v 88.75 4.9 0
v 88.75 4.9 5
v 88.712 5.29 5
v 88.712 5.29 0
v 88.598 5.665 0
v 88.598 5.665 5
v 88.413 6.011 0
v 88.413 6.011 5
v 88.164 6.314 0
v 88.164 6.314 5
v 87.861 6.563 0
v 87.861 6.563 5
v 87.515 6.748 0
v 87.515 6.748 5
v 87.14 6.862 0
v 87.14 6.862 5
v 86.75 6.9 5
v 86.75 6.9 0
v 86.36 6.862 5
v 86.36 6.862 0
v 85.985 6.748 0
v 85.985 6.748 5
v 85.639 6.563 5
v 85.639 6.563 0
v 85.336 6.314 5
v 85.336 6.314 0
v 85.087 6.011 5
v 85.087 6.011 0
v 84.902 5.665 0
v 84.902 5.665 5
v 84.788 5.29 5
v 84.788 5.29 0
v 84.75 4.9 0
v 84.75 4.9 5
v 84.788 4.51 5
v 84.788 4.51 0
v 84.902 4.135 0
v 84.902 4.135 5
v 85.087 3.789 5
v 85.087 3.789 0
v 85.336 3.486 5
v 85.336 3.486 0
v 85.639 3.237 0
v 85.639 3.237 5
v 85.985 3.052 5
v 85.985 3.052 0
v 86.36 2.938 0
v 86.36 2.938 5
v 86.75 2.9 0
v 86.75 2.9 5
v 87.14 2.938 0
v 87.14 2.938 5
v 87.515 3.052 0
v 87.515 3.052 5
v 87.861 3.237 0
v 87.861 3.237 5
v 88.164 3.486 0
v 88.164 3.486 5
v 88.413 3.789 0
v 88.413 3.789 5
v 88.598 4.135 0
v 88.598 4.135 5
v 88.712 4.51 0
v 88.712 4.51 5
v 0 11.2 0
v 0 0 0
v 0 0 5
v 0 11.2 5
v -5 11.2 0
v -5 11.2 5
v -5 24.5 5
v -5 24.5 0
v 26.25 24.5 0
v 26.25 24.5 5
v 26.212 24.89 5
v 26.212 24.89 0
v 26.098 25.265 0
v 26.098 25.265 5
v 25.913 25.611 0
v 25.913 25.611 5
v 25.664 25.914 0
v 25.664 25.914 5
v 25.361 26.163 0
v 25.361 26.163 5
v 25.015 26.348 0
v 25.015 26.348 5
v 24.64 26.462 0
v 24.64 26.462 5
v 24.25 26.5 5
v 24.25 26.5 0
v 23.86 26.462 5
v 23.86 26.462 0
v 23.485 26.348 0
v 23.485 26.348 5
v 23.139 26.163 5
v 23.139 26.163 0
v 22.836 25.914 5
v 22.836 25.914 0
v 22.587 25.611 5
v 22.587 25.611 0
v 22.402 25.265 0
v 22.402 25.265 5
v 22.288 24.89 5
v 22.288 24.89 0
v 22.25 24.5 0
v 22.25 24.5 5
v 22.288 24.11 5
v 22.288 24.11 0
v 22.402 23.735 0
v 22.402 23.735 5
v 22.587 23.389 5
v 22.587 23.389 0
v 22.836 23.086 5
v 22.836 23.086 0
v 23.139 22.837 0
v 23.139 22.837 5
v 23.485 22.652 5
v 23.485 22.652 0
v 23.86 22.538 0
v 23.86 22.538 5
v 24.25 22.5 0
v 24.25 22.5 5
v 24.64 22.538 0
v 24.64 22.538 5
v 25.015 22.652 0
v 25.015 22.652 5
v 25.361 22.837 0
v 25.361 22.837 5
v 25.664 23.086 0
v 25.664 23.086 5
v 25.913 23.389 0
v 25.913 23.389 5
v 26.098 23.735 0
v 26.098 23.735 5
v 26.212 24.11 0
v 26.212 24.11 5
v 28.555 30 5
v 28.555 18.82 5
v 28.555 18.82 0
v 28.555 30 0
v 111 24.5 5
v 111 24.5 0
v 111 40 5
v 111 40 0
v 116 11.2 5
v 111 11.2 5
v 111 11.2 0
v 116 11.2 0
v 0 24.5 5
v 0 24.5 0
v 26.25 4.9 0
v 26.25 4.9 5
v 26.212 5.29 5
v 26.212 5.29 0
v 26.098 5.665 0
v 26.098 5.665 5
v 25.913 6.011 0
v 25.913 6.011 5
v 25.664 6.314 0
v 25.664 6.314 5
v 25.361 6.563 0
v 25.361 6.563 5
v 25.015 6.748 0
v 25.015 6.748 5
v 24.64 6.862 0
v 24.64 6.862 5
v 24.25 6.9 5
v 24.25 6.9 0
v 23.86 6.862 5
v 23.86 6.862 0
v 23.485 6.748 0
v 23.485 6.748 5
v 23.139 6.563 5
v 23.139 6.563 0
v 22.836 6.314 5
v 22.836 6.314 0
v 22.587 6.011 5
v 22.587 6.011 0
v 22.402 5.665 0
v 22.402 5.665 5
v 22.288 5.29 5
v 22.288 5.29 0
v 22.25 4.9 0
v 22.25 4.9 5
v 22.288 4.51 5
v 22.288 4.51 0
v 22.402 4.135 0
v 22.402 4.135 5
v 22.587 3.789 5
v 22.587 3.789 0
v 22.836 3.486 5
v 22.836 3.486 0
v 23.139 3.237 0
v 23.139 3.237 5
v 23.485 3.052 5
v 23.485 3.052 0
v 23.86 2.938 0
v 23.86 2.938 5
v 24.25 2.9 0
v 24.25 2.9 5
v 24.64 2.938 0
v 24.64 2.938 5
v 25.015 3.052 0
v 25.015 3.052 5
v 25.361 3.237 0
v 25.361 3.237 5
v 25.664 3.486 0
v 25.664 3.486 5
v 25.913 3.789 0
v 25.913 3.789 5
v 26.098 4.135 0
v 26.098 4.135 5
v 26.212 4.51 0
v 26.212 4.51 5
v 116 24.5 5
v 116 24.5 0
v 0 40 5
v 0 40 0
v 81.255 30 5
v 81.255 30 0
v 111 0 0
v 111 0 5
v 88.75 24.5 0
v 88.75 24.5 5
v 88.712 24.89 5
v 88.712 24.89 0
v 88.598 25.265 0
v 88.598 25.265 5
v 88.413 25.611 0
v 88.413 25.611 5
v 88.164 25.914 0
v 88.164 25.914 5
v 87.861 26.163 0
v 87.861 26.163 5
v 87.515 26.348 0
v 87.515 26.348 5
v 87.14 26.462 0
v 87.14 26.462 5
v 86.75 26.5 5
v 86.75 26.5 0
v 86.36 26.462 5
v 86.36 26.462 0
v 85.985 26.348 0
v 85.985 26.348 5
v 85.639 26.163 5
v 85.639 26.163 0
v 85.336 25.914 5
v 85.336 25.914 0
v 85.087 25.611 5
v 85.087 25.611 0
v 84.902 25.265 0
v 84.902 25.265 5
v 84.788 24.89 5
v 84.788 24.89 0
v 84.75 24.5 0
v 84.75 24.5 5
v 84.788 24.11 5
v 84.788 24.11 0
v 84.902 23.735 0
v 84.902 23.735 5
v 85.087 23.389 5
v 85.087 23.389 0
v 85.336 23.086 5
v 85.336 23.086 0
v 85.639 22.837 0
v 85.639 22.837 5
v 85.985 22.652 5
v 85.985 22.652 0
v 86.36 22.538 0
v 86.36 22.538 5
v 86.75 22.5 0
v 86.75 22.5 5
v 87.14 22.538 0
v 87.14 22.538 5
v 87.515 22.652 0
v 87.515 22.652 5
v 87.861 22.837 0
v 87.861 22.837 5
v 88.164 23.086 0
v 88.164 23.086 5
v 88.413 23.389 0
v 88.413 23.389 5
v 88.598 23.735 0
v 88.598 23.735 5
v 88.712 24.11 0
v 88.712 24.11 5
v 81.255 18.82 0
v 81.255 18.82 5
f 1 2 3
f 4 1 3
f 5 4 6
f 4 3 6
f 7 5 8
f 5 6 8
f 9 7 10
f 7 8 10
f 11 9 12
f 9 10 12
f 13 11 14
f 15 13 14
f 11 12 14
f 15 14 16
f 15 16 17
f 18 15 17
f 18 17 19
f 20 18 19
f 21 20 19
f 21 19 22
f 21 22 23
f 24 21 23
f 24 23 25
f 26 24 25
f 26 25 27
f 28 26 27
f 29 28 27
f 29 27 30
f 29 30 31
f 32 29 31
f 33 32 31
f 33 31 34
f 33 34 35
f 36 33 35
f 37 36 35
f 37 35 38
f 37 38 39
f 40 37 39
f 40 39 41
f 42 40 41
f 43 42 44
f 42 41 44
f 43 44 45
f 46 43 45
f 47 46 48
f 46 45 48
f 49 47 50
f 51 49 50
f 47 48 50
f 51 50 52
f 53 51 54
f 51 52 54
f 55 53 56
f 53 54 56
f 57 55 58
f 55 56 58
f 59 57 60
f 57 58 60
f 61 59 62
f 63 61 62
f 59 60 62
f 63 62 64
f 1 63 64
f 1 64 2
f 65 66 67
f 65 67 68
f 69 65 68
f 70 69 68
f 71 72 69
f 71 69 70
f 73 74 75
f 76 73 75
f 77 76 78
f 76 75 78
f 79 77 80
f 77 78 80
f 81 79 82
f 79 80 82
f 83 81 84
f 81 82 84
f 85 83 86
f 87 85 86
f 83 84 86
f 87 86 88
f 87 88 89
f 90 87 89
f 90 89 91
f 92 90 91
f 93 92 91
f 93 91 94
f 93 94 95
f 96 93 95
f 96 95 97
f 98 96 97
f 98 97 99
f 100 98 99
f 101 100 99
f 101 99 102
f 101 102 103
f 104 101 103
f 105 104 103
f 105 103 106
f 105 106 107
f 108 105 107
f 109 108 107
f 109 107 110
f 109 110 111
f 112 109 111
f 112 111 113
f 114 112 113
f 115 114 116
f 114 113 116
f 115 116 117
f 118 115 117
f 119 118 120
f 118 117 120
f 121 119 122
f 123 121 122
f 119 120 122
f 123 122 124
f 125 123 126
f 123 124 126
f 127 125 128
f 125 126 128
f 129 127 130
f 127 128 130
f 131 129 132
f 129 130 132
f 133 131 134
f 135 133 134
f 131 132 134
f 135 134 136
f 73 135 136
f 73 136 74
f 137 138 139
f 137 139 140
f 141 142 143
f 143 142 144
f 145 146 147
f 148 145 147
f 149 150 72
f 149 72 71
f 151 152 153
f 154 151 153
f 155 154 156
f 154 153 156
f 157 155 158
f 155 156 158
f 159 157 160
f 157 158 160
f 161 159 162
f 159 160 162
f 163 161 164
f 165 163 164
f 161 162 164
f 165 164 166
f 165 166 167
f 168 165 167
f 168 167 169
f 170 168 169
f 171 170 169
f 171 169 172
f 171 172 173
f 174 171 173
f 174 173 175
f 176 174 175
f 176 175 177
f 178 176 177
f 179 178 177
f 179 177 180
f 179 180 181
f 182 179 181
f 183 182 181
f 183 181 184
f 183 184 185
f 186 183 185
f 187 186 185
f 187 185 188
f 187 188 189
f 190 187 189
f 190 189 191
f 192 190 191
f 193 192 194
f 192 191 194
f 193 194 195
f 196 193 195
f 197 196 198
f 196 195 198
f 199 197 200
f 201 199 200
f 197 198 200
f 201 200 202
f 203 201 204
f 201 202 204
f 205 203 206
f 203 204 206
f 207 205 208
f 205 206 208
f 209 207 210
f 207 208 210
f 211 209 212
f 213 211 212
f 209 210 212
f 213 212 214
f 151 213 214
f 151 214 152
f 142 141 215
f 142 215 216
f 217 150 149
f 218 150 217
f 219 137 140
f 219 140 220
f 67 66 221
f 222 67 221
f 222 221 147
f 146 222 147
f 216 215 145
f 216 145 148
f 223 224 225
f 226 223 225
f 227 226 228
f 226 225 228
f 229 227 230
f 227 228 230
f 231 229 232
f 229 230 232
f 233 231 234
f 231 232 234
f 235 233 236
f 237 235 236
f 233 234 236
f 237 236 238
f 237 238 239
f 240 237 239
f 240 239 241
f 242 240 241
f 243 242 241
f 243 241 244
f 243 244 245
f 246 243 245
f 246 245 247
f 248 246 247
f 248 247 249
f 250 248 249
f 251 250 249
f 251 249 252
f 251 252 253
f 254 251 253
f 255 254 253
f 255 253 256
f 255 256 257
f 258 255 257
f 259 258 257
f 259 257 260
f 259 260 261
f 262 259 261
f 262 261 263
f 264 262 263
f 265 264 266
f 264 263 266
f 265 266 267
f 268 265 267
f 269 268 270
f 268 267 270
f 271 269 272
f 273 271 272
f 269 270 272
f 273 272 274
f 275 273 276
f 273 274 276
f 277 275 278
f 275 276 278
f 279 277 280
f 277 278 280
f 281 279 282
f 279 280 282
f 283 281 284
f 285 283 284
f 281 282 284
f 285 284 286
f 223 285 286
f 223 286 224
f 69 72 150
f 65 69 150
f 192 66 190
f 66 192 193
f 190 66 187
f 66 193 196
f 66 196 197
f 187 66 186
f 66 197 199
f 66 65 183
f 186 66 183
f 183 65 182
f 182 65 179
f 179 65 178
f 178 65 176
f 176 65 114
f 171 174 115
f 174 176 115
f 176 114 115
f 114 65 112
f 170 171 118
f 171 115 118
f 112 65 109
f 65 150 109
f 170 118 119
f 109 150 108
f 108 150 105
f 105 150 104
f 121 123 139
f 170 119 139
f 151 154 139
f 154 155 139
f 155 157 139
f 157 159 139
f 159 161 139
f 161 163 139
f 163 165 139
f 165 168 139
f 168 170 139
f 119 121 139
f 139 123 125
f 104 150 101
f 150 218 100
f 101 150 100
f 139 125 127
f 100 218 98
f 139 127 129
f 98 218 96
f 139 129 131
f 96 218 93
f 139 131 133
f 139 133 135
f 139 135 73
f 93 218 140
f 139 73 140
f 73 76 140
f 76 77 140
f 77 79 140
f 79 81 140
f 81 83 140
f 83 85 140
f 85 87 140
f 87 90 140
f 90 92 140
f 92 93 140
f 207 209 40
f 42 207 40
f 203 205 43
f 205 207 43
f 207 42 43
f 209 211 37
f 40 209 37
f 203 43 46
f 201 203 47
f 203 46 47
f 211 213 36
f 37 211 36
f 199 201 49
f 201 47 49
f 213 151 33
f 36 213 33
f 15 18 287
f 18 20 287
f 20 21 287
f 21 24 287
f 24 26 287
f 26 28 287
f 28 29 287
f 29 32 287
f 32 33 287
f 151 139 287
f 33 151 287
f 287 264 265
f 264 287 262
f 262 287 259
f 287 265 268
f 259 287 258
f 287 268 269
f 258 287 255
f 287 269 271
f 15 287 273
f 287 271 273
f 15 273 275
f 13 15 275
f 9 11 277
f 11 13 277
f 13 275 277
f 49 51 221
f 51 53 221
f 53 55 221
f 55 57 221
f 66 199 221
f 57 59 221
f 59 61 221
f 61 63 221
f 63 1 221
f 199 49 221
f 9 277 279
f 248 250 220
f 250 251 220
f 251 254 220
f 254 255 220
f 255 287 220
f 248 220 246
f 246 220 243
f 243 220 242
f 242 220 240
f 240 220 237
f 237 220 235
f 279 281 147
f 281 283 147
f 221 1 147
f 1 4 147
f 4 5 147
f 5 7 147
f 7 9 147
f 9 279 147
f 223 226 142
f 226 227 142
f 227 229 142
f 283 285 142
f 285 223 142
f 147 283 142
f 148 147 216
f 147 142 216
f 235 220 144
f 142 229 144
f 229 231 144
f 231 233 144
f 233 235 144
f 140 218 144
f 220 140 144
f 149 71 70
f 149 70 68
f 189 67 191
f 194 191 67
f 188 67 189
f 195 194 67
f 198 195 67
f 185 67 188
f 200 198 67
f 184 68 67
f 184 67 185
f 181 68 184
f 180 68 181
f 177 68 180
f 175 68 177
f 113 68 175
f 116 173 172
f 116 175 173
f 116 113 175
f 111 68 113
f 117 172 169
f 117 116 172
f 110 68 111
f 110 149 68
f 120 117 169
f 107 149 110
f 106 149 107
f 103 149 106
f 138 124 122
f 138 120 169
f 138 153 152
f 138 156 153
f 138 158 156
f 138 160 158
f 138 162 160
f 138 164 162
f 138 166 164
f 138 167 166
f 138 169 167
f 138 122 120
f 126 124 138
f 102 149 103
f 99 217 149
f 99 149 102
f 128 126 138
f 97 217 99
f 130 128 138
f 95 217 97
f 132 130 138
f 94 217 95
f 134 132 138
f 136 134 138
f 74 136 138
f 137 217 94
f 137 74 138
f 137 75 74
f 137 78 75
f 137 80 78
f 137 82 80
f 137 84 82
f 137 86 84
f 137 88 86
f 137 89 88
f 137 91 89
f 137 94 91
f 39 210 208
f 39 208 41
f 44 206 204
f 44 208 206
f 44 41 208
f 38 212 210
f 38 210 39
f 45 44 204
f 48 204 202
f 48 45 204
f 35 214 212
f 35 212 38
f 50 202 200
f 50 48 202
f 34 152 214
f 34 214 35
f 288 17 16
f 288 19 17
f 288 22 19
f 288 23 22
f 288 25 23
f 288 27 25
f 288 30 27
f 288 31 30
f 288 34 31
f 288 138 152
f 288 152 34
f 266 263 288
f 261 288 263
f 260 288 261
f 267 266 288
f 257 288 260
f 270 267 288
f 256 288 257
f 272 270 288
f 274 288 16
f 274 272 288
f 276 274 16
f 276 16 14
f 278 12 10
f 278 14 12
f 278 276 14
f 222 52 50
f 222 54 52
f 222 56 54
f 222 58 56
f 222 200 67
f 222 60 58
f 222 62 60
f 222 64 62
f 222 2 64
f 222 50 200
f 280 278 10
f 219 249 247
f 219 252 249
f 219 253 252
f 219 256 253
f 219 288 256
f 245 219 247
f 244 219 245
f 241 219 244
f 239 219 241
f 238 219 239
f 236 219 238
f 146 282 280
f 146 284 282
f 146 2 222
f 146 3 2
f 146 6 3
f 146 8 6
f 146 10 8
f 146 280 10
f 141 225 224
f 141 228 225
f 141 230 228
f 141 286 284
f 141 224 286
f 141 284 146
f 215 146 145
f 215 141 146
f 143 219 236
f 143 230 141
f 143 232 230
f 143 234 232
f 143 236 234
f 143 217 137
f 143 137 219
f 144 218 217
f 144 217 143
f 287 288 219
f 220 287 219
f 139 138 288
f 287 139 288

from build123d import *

# Parameters (mm, degrees)
CROQUIS1_W              = 111
CROQUIS1_H              = 40
SALIENTE_EXTRUIR1_DEPTH = 5
CROQUIS2_R              = 2
CROQUIS2_W              = 52.7
CROQUIS2_H              = 11.179597985
CORTAR_EXTRUIR1_DEPTH   = 10
CROQUIS3_W              = 5
CROQUIS3_H              = 13.3
SALIENTE_EXTRUIR2_DEPTH = 5
CROQUIS4_W              = 5
CROQUIS4_H              = 13.3
SALIENTE_EXTRUIR3_DEPTH = 5


with BuildPart() as part:
    # Croquis1 → Saliente-Extruir1 (new body)
    with BuildSketch(Plane.XY):
        with Locations((55.5, 20)):
            Rectangle(CROQUIS1_W, CROQUIS1_H)
    extrude(amount=SALIENTE_EXTRUIR1_DEPTH)

    # Croquis2 → Cortar-Extruir1 (cut)
    with BuildSketch(Plane.XY.offset(5)):
        with Locations((24.25, 24.5)):
            Circle(CROQUIS2_R)
        with Locations((86.75, 24.5)):
            Circle(CROQUIS2_R)
        with Locations((24.25, 4.9)):
            Circle(CROQUIS2_R)
        with Locations((86.75, 4.9)):
            Circle(CROQUIS2_R)
        with Locations((54.905498666, 24.410201008)):
            Rectangle(CROQUIS2_W, CROQUIS2_H)
    extrude(amount=-CORTAR_EXTRUIR1_DEPTH, mode=Mode.SUBTRACT)

    # Croquis3 → Saliente-Extruir2 (add)
    with BuildSketch(Plane.ZY):
        with Locations((2.5, 17.85)):
            Rectangle(CROQUIS3_W, CROQUIS3_H)
    extrude(amount=SALIENTE_EXTRUIR2_DEPTH)

    # Croquis4 → Saliente-Extruir3 (add)
    with BuildSketch(Plane(origin=(111, 0, 0), x_dir=(0, 0, -1), z_dir=(1, 0, 0))):
        with Locations((-2.5, 17.85)):
            Rectangle(CROQUIS4_W, CROQUIS4_H)
    extrude(amount=SALIENTE_EXTRUIR3_DEPTH)


solid = part.part
